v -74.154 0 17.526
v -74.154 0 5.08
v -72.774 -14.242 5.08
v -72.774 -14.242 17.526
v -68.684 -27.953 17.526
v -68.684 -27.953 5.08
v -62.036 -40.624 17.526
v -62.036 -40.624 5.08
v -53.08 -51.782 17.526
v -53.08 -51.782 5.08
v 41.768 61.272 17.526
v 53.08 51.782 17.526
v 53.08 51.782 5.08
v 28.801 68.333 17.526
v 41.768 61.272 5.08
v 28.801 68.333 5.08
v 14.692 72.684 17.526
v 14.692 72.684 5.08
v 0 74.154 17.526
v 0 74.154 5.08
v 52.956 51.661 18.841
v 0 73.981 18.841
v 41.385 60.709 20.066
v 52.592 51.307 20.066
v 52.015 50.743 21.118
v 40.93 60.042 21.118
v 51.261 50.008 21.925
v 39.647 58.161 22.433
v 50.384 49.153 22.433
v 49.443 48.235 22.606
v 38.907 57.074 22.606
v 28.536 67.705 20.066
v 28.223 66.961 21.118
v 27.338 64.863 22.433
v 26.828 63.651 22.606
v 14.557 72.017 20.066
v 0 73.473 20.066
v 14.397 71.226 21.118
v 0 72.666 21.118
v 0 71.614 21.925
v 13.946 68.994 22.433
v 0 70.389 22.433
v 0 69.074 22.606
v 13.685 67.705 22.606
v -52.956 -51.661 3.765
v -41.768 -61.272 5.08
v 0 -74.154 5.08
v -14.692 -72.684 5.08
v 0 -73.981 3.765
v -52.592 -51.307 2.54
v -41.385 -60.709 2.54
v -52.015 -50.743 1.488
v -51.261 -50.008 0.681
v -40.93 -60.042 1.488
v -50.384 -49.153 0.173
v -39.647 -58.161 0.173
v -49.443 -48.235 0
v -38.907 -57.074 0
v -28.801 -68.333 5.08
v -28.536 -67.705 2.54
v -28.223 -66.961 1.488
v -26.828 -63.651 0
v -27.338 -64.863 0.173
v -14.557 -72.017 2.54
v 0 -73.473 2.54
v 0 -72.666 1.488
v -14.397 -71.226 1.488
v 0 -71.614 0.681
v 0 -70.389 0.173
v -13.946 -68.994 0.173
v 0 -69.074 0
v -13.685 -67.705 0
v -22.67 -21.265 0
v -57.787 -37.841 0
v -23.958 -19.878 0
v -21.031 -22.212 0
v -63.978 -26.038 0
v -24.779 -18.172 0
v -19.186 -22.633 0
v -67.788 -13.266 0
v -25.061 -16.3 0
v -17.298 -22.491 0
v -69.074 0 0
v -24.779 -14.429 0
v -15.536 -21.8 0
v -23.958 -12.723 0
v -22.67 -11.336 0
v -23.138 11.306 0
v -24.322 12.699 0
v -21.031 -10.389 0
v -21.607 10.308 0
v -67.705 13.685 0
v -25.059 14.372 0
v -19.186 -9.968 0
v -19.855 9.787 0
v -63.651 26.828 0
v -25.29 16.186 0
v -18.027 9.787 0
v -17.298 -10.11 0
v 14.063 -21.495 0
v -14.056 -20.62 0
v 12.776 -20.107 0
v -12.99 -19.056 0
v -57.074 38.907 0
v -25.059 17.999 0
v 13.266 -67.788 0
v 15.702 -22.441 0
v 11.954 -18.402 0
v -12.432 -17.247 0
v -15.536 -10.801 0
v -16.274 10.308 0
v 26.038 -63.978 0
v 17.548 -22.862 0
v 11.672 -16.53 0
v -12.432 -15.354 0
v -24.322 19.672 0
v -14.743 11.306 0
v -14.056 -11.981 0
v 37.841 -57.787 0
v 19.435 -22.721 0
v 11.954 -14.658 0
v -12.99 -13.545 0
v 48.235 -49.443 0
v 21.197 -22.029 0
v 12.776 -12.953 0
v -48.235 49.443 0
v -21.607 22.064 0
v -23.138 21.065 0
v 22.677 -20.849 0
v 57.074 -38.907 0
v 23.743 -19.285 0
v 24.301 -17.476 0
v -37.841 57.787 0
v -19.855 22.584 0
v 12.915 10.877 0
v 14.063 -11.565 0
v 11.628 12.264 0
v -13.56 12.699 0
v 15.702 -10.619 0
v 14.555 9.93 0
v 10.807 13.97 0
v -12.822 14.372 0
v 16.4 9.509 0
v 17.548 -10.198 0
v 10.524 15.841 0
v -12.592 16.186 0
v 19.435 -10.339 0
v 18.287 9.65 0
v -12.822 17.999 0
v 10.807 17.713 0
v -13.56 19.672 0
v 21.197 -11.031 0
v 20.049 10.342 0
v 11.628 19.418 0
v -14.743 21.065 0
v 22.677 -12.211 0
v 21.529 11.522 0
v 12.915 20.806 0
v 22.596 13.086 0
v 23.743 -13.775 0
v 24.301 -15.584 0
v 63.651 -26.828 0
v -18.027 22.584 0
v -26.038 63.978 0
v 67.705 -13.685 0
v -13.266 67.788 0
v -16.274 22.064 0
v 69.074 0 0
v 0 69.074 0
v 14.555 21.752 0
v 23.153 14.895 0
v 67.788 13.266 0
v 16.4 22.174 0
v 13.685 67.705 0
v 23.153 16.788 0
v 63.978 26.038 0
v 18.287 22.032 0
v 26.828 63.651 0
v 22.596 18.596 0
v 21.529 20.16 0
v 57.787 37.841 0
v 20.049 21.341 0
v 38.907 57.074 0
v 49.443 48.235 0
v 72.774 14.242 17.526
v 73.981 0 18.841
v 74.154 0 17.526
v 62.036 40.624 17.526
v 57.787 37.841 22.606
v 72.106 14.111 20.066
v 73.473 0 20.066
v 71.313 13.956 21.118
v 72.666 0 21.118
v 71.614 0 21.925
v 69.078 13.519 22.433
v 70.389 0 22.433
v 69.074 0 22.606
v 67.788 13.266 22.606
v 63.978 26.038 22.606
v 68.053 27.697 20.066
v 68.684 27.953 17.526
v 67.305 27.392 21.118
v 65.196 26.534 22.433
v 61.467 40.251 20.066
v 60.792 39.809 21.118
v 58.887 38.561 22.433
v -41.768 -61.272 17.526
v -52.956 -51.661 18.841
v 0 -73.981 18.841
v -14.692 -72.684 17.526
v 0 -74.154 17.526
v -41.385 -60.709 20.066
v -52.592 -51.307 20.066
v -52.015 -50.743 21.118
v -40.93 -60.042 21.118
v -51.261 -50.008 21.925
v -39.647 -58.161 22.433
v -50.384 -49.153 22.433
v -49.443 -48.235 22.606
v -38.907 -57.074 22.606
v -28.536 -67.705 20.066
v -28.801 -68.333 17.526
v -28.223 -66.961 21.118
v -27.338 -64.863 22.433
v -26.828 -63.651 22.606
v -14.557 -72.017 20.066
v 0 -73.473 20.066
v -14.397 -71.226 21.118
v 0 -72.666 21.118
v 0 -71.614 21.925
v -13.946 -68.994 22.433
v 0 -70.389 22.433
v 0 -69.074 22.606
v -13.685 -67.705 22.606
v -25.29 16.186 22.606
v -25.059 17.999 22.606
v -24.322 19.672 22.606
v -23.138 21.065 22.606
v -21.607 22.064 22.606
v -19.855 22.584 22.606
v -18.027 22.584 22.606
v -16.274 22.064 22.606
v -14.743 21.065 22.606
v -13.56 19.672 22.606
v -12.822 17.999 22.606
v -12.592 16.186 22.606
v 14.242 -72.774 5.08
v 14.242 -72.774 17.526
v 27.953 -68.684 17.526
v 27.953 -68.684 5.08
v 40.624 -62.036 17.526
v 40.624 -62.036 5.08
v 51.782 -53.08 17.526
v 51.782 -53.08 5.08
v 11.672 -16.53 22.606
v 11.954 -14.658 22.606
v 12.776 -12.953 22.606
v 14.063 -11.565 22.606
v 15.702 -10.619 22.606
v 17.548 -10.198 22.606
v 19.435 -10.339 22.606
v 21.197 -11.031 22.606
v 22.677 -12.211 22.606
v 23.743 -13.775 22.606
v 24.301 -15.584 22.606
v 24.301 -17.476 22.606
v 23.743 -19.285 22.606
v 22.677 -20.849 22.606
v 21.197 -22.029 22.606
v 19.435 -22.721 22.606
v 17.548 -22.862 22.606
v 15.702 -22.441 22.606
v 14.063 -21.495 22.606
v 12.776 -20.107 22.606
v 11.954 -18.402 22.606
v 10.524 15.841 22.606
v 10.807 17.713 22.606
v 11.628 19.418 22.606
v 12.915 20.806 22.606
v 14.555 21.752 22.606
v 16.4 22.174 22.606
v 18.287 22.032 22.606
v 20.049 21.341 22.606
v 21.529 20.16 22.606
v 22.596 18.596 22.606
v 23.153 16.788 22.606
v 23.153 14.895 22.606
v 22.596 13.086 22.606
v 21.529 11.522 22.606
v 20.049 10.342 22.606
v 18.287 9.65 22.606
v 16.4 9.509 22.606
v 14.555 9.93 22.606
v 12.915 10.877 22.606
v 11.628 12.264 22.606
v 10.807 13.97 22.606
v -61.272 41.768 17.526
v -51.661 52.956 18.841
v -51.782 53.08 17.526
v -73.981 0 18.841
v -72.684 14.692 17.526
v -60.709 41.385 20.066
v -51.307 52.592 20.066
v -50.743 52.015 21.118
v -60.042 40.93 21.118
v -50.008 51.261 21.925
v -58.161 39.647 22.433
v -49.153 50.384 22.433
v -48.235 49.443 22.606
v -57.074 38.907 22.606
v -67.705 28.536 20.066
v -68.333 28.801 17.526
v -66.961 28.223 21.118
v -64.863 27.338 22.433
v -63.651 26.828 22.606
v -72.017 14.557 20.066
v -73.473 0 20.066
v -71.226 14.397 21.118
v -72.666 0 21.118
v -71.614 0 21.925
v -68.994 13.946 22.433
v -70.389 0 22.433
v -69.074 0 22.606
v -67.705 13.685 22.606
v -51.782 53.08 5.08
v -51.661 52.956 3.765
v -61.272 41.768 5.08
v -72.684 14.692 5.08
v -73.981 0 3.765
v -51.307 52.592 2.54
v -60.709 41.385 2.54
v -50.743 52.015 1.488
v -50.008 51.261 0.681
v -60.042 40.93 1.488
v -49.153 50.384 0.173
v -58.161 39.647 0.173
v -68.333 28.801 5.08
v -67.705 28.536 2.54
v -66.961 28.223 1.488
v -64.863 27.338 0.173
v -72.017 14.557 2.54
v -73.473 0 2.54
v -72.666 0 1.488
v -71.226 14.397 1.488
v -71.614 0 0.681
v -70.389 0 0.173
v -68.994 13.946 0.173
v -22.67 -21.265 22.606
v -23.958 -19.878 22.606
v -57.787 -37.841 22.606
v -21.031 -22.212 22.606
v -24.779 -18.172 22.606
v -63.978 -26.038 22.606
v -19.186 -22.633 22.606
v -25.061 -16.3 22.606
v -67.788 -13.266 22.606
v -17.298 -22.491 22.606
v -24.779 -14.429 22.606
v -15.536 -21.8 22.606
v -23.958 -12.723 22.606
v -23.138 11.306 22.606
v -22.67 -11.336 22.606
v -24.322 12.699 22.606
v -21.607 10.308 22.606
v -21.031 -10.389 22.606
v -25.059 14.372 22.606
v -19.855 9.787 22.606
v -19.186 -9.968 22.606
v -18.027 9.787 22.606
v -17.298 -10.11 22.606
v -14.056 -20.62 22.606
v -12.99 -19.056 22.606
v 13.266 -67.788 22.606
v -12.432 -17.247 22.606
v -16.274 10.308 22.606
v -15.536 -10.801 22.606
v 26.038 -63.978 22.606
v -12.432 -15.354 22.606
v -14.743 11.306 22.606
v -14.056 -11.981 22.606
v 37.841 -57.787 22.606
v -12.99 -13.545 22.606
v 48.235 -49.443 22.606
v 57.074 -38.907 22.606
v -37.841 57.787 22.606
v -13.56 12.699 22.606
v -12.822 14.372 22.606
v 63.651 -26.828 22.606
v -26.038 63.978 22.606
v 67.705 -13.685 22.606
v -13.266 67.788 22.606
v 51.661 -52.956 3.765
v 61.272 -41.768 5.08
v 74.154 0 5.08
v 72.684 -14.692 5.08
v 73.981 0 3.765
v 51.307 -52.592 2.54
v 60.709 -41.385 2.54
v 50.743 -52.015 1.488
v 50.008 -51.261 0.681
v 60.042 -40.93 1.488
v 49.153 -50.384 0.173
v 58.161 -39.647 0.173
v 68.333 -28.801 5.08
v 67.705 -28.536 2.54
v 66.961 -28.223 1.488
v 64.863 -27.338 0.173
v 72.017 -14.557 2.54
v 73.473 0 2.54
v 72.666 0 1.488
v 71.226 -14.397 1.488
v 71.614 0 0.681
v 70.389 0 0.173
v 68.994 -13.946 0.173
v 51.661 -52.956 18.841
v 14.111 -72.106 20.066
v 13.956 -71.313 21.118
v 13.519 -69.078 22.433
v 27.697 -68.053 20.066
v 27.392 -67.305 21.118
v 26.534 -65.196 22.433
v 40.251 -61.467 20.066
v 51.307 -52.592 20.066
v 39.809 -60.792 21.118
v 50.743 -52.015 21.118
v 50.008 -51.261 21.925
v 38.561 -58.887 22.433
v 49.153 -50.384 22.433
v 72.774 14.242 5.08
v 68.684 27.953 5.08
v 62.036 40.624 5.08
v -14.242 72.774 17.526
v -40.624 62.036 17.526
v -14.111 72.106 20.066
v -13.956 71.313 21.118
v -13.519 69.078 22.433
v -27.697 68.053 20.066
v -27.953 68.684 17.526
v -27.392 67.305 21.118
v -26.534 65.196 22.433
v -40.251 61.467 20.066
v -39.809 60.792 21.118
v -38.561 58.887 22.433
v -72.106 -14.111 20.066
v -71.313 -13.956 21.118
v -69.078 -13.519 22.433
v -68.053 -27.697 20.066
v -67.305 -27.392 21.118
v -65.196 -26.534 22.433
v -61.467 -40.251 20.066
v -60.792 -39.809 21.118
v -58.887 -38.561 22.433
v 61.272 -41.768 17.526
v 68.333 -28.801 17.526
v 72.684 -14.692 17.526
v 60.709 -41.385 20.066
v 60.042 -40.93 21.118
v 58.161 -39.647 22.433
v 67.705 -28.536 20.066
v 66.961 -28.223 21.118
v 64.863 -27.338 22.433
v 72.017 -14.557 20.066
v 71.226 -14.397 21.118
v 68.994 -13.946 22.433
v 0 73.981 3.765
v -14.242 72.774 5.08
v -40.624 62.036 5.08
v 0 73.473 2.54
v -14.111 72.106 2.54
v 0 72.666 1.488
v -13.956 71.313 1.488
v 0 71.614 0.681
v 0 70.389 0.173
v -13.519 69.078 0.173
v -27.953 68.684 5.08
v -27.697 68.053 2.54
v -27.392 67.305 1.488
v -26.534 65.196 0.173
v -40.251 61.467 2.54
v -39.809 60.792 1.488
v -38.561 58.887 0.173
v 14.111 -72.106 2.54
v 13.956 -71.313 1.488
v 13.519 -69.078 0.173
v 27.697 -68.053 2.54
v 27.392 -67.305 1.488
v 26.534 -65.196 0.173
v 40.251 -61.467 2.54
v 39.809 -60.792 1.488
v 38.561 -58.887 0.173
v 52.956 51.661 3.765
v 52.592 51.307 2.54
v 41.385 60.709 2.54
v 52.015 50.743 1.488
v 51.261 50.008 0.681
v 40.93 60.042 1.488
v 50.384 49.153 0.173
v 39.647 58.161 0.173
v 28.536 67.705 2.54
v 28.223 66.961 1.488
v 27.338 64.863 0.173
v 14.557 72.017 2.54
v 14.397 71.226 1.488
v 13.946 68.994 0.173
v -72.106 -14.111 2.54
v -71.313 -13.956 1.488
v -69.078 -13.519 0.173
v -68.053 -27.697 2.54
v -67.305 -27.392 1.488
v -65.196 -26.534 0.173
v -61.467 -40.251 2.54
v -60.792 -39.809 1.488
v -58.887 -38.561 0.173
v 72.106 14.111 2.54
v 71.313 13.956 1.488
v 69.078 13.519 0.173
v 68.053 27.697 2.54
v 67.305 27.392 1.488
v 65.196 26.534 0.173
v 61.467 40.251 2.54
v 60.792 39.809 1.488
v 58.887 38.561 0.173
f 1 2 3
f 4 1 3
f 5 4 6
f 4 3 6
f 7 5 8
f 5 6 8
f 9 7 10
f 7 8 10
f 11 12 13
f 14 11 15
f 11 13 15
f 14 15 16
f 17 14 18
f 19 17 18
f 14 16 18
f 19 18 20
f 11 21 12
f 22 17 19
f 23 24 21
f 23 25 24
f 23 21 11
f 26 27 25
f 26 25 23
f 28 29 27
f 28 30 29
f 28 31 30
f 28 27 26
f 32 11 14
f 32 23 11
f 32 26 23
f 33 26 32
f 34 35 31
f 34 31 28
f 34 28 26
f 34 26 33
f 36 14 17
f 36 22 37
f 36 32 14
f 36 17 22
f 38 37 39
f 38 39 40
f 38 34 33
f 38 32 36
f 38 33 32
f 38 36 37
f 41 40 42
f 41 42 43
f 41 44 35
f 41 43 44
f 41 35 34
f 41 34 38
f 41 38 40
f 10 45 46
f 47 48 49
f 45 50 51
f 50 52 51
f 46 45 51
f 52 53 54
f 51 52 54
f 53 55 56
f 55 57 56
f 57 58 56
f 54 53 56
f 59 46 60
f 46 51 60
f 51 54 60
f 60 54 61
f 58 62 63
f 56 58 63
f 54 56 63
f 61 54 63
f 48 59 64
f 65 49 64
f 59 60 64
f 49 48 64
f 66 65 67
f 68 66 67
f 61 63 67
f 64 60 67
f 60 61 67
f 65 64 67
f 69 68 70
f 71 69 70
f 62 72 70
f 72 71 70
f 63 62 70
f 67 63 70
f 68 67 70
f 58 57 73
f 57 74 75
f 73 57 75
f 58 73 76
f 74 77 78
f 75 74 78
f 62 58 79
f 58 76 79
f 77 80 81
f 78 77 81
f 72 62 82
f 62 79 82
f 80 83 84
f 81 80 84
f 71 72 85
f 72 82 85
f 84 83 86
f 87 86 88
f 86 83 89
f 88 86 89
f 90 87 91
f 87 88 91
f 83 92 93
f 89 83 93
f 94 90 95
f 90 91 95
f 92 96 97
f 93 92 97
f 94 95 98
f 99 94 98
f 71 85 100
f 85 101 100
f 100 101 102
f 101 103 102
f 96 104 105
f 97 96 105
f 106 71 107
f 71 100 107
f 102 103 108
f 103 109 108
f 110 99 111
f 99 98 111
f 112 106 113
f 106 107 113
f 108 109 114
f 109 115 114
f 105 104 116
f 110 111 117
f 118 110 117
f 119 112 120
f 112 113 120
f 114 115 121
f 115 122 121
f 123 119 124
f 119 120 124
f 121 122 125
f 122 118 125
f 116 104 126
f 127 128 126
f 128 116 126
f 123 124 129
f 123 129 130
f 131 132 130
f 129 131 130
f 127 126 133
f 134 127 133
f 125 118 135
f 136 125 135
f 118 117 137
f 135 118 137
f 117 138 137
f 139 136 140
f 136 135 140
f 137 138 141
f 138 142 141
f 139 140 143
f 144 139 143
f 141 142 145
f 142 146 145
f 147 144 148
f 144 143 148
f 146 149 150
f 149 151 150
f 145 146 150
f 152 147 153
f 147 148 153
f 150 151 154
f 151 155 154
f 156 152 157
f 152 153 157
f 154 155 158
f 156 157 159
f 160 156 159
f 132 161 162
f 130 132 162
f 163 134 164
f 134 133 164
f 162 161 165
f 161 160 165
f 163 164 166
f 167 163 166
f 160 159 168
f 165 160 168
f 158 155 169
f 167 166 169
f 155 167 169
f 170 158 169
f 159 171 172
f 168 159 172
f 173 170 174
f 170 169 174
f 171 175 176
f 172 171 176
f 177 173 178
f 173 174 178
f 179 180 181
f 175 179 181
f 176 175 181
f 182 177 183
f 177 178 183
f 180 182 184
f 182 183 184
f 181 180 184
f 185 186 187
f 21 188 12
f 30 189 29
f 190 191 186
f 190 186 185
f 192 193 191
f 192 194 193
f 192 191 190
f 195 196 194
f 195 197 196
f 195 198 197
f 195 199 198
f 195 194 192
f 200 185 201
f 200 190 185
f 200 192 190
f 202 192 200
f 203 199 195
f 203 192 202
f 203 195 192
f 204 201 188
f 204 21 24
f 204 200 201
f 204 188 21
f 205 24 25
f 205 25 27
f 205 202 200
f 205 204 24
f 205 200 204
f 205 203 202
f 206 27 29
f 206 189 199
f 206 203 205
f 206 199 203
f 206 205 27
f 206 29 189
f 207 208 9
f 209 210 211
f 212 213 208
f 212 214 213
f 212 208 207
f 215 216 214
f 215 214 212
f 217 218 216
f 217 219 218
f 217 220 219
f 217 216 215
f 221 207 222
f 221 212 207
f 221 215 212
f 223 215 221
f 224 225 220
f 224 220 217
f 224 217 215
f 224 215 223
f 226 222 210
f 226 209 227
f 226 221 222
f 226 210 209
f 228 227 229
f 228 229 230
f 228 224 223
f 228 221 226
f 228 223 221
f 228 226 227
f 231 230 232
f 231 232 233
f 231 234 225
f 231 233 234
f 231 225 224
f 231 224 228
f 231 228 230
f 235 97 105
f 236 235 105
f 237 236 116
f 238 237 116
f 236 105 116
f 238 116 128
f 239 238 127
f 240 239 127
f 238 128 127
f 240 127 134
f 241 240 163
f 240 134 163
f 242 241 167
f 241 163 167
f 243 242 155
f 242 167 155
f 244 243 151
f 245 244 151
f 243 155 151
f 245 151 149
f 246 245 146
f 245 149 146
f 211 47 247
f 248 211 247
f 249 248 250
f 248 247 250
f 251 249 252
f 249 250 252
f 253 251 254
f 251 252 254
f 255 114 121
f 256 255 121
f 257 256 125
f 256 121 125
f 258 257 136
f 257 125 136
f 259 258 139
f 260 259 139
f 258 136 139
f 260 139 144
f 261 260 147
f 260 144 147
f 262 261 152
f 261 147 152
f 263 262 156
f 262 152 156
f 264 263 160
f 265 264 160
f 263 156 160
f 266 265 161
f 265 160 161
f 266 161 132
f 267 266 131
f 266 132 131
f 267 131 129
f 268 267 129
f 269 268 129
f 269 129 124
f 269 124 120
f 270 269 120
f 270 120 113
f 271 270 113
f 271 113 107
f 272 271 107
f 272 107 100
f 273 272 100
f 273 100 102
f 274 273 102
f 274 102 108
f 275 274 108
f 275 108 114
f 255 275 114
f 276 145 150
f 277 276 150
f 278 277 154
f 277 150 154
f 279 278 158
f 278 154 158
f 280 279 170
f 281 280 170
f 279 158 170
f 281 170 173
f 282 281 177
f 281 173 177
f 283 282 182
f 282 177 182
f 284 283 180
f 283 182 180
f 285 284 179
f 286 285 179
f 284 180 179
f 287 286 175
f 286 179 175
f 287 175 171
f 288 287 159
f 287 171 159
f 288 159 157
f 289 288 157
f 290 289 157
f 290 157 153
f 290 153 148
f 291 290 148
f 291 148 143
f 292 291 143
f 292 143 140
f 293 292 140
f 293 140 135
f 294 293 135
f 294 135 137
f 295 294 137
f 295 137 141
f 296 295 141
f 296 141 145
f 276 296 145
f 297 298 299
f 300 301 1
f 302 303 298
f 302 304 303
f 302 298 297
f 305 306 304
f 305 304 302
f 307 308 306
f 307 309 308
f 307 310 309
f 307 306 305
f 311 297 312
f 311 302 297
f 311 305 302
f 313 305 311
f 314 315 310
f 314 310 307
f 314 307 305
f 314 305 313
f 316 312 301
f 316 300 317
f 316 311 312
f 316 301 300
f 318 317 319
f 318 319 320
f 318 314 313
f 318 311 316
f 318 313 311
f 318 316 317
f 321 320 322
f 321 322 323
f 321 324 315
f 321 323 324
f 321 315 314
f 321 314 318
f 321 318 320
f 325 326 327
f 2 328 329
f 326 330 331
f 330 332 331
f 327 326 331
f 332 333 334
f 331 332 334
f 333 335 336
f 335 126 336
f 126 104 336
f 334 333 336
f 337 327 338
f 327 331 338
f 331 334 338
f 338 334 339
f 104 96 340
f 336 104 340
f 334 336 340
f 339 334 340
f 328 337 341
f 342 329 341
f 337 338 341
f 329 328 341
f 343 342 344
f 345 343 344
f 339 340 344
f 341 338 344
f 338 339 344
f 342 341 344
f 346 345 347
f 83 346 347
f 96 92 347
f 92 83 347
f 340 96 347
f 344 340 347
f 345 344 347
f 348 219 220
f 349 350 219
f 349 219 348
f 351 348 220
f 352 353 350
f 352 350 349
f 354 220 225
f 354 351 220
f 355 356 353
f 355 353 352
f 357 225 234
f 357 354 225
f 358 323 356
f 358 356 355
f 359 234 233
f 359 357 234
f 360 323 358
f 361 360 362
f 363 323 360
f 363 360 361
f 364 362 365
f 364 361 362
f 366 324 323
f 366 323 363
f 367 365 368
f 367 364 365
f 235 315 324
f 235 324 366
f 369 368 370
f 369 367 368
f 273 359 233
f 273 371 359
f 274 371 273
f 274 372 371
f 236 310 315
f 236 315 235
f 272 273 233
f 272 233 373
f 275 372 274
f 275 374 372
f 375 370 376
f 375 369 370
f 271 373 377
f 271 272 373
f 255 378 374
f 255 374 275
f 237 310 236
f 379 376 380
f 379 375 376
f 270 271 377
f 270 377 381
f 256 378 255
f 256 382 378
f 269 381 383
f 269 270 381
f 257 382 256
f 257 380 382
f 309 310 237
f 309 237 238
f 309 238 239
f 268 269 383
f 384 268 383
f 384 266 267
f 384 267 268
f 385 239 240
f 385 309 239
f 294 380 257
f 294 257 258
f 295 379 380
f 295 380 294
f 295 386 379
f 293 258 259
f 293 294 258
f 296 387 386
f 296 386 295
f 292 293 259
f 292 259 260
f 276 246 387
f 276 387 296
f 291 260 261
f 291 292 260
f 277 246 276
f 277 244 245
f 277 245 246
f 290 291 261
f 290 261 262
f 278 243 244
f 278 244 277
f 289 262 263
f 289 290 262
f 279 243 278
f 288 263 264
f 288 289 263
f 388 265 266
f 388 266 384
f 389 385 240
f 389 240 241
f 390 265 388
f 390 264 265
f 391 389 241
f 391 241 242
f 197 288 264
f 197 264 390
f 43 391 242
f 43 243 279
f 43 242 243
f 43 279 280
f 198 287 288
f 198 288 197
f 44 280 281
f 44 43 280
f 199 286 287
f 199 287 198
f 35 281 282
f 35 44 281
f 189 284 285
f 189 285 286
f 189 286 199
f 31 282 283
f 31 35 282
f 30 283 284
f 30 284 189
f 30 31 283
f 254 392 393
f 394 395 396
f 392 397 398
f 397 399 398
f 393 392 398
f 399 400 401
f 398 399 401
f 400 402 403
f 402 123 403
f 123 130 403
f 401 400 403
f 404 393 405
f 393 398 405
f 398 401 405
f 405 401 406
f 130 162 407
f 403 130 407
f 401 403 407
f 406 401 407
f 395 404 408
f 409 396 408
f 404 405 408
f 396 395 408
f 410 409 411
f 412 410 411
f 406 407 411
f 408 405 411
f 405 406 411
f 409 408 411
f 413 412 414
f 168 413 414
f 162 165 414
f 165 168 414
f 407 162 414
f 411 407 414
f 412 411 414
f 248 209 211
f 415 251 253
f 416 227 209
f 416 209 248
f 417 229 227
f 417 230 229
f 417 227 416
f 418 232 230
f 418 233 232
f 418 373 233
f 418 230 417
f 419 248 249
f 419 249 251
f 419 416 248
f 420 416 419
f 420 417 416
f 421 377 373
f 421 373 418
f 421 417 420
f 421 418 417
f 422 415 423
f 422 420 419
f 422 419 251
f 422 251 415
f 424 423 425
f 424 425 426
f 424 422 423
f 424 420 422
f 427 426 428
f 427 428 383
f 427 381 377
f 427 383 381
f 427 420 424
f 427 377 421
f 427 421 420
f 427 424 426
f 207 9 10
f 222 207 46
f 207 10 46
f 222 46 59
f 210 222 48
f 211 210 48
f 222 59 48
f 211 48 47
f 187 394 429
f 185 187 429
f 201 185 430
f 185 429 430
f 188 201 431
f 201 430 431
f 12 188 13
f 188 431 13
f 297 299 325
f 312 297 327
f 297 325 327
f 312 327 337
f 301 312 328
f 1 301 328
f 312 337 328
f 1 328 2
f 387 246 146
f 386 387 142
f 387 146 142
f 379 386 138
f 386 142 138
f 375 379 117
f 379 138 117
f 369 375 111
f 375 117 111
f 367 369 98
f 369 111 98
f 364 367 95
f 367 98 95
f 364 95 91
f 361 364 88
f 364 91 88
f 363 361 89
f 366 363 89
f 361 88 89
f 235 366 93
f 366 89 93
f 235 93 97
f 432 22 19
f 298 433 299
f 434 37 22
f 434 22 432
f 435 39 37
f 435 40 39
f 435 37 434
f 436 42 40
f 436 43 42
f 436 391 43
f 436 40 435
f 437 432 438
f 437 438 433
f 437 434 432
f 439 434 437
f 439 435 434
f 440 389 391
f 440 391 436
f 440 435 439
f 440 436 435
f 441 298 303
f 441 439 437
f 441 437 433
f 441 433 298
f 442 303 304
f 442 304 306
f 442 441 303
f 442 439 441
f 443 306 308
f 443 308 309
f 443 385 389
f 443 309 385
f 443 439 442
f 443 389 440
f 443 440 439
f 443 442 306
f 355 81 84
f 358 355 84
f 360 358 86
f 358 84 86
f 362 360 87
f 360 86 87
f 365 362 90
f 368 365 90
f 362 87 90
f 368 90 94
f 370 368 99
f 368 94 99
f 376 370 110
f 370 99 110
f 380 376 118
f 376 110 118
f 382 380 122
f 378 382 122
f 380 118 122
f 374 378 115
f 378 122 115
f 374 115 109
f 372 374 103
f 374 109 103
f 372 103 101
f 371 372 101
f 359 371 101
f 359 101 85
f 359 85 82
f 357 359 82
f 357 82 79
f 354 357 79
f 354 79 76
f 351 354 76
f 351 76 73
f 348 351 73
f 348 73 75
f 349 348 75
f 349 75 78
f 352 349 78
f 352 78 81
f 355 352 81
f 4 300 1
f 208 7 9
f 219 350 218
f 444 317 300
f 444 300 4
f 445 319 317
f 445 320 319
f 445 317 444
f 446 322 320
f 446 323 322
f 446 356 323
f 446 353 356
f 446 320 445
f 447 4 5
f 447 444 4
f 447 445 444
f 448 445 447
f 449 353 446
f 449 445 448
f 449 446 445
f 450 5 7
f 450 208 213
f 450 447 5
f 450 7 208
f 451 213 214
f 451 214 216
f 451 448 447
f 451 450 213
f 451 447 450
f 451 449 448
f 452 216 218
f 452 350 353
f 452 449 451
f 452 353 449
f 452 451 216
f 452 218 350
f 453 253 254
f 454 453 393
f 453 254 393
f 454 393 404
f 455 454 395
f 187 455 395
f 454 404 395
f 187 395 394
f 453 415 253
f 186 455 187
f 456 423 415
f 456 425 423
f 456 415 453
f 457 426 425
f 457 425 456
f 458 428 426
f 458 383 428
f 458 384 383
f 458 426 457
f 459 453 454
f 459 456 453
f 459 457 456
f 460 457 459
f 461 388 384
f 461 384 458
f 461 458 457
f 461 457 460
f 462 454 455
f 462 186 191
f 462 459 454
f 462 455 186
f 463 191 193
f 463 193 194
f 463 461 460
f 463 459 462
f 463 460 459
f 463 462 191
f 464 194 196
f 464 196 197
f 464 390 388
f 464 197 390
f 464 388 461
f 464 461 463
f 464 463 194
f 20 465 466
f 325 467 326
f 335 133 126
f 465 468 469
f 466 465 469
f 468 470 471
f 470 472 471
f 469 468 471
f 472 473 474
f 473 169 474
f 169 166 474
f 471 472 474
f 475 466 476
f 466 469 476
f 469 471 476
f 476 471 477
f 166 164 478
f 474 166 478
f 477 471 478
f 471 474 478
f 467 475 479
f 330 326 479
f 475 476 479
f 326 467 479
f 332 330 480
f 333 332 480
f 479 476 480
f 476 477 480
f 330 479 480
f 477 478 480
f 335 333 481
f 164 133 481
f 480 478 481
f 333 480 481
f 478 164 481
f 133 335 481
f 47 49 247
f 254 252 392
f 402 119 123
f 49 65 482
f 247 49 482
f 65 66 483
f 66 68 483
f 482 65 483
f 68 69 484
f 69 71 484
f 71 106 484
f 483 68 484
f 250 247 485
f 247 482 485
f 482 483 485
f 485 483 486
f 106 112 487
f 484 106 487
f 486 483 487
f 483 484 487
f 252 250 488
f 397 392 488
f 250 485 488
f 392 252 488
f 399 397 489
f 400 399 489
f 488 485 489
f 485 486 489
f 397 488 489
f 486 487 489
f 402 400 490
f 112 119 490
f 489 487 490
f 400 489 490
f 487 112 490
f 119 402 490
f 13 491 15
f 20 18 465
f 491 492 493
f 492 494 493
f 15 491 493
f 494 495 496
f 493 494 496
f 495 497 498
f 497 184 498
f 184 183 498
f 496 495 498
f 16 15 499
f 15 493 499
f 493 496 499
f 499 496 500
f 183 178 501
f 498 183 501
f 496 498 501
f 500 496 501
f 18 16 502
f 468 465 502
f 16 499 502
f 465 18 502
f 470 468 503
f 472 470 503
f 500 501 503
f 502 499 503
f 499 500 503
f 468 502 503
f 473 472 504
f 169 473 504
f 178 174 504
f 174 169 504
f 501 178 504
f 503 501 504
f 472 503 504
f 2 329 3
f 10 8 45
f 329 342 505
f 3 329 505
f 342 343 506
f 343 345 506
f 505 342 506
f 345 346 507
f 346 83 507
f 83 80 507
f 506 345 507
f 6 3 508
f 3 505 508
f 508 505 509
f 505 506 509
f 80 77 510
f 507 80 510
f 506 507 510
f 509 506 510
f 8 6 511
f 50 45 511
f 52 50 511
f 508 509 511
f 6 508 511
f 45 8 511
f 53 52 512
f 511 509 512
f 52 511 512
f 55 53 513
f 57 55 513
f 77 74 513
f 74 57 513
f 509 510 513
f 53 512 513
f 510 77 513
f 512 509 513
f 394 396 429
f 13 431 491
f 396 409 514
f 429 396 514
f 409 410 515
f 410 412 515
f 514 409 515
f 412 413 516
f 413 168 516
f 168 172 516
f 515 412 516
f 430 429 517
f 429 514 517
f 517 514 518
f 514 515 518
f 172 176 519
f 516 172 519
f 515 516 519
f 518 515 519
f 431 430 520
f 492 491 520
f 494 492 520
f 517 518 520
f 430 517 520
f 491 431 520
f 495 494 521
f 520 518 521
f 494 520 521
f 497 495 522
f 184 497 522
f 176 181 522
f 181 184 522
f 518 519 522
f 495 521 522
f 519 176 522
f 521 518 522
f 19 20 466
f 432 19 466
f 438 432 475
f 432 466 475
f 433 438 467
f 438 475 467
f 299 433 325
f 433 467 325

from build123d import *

# Parameters (mm, degrees)
F1_DEPTH   = 22.606
F2_R       = 5.08
F5_D       = 12.7
F5_ON_F4_D = 12.7


with BuildPart() as f1:
    # F0 (on Top) → F1 (new body)
    with BuildSketch(Plane.XY):
        with BuildLine():
            ThreePointArc((0, -74.1540131918), (27.9531270487, -68.6836251274), (51.7820146668, -53.0795688518))
            Line((51.7820146668, -53.0795688518), (0, 0))
            Line((0, 0), (0, -74.1540131918))
        make_face()
        with BuildLine():
            ThreePointArc((51.7820146668, -53.0795688518), (68.3325027755, -28.8008113926), (74.1540131918, 0))
            Line((74.1540131918, 0), (0, 0))
            Line((0, 0), (51.7820146668, -53.0795688518))
        make_face()
        with BuildLine():
            Line((0, 0), (74.1540131918, 0))
            ThreePointArc((74.1540131918, 0), (68.6836251274, 27.9531270487), (53.0795688518, 51.7820146668))
            Line((53.0795688518, 51.7820146668), (0, 0))
        make_face()
        with BuildLine():
            Line((0, 0), (53.0795688518, 51.7820146668))
            ThreePointArc((53.0795688518, 51.7820146668), (28.8008113926, 68.3325027755), (0, 74.1540131918))
            Line((0, 74.1540131918), (0, 0))
        make_face()
        with BuildLine():
            Line((-51.7820146668, 53.0795688518), (0, 0))
            Line((0, 0), (0, 74.1540131918))
            ThreePointArc((0, 74.1540131918), (-27.9531270487, 68.6836251274), (-51.7820146668, 53.0795688518))
        make_face()
        with BuildLine():
            Line((-74.1540131918, 0), (0, 0))
            Line((0, 0), (-51.7820146668, 53.0795688518))
            ThreePointArc((-51.7820146668, 53.0795688518), (-68.3325027755, 28.8008113926), (-74.1540131918, 0))
        make_face()
        with BuildLine():
            Line((-53.0795688518, -51.7820146668), (0, 0))
            Line((0, 0), (-74.1540131918, 0))
            ThreePointArc((-74.1540131918, 0), (-68.6836251274, -27.9531270487), (-53.0795688518, -51.7820146668))
        make_face()
        with BuildLine():
            Line((0, -74.1540131918), (0, 0))
            Line((0, 0), (-53.0795688518, -51.7820146668))
            ThreePointArc((-53.0795688518, -51.7820146668), (-28.8008113926, -68.3325027755), (0, -74.1540131918))
        make_face()
    extrude(amount=F1_DEPTH)

    # F2
    f2_edges = [f1.edges().sort_by_distance(p)[0] for p in [
        (53.079569, 51.782015, 22.606),
        (53.079569, 51.782015, 0),
    ]]
    fillet(f2_edges, radius=F2_R)

    # F5 (through all)
    with Locations(Plane.XY.offset(22.606)):
        with Locations((-18.9406760037, 16.0708744079), (16.8744213879, 15.8412903547), (-18.7110900879, -16.300458461)):
            Hole(F5_D / 2)

    # F5 on F4 (through all)
    with Locations(Plane.XY.offset(22.606)):
        with Locations((18.0223360658, -16.5300425142), (-18.9406760037, 16.300458461)):
            Hole(F5_ON_F4_D / 2)


solid = f1.part
